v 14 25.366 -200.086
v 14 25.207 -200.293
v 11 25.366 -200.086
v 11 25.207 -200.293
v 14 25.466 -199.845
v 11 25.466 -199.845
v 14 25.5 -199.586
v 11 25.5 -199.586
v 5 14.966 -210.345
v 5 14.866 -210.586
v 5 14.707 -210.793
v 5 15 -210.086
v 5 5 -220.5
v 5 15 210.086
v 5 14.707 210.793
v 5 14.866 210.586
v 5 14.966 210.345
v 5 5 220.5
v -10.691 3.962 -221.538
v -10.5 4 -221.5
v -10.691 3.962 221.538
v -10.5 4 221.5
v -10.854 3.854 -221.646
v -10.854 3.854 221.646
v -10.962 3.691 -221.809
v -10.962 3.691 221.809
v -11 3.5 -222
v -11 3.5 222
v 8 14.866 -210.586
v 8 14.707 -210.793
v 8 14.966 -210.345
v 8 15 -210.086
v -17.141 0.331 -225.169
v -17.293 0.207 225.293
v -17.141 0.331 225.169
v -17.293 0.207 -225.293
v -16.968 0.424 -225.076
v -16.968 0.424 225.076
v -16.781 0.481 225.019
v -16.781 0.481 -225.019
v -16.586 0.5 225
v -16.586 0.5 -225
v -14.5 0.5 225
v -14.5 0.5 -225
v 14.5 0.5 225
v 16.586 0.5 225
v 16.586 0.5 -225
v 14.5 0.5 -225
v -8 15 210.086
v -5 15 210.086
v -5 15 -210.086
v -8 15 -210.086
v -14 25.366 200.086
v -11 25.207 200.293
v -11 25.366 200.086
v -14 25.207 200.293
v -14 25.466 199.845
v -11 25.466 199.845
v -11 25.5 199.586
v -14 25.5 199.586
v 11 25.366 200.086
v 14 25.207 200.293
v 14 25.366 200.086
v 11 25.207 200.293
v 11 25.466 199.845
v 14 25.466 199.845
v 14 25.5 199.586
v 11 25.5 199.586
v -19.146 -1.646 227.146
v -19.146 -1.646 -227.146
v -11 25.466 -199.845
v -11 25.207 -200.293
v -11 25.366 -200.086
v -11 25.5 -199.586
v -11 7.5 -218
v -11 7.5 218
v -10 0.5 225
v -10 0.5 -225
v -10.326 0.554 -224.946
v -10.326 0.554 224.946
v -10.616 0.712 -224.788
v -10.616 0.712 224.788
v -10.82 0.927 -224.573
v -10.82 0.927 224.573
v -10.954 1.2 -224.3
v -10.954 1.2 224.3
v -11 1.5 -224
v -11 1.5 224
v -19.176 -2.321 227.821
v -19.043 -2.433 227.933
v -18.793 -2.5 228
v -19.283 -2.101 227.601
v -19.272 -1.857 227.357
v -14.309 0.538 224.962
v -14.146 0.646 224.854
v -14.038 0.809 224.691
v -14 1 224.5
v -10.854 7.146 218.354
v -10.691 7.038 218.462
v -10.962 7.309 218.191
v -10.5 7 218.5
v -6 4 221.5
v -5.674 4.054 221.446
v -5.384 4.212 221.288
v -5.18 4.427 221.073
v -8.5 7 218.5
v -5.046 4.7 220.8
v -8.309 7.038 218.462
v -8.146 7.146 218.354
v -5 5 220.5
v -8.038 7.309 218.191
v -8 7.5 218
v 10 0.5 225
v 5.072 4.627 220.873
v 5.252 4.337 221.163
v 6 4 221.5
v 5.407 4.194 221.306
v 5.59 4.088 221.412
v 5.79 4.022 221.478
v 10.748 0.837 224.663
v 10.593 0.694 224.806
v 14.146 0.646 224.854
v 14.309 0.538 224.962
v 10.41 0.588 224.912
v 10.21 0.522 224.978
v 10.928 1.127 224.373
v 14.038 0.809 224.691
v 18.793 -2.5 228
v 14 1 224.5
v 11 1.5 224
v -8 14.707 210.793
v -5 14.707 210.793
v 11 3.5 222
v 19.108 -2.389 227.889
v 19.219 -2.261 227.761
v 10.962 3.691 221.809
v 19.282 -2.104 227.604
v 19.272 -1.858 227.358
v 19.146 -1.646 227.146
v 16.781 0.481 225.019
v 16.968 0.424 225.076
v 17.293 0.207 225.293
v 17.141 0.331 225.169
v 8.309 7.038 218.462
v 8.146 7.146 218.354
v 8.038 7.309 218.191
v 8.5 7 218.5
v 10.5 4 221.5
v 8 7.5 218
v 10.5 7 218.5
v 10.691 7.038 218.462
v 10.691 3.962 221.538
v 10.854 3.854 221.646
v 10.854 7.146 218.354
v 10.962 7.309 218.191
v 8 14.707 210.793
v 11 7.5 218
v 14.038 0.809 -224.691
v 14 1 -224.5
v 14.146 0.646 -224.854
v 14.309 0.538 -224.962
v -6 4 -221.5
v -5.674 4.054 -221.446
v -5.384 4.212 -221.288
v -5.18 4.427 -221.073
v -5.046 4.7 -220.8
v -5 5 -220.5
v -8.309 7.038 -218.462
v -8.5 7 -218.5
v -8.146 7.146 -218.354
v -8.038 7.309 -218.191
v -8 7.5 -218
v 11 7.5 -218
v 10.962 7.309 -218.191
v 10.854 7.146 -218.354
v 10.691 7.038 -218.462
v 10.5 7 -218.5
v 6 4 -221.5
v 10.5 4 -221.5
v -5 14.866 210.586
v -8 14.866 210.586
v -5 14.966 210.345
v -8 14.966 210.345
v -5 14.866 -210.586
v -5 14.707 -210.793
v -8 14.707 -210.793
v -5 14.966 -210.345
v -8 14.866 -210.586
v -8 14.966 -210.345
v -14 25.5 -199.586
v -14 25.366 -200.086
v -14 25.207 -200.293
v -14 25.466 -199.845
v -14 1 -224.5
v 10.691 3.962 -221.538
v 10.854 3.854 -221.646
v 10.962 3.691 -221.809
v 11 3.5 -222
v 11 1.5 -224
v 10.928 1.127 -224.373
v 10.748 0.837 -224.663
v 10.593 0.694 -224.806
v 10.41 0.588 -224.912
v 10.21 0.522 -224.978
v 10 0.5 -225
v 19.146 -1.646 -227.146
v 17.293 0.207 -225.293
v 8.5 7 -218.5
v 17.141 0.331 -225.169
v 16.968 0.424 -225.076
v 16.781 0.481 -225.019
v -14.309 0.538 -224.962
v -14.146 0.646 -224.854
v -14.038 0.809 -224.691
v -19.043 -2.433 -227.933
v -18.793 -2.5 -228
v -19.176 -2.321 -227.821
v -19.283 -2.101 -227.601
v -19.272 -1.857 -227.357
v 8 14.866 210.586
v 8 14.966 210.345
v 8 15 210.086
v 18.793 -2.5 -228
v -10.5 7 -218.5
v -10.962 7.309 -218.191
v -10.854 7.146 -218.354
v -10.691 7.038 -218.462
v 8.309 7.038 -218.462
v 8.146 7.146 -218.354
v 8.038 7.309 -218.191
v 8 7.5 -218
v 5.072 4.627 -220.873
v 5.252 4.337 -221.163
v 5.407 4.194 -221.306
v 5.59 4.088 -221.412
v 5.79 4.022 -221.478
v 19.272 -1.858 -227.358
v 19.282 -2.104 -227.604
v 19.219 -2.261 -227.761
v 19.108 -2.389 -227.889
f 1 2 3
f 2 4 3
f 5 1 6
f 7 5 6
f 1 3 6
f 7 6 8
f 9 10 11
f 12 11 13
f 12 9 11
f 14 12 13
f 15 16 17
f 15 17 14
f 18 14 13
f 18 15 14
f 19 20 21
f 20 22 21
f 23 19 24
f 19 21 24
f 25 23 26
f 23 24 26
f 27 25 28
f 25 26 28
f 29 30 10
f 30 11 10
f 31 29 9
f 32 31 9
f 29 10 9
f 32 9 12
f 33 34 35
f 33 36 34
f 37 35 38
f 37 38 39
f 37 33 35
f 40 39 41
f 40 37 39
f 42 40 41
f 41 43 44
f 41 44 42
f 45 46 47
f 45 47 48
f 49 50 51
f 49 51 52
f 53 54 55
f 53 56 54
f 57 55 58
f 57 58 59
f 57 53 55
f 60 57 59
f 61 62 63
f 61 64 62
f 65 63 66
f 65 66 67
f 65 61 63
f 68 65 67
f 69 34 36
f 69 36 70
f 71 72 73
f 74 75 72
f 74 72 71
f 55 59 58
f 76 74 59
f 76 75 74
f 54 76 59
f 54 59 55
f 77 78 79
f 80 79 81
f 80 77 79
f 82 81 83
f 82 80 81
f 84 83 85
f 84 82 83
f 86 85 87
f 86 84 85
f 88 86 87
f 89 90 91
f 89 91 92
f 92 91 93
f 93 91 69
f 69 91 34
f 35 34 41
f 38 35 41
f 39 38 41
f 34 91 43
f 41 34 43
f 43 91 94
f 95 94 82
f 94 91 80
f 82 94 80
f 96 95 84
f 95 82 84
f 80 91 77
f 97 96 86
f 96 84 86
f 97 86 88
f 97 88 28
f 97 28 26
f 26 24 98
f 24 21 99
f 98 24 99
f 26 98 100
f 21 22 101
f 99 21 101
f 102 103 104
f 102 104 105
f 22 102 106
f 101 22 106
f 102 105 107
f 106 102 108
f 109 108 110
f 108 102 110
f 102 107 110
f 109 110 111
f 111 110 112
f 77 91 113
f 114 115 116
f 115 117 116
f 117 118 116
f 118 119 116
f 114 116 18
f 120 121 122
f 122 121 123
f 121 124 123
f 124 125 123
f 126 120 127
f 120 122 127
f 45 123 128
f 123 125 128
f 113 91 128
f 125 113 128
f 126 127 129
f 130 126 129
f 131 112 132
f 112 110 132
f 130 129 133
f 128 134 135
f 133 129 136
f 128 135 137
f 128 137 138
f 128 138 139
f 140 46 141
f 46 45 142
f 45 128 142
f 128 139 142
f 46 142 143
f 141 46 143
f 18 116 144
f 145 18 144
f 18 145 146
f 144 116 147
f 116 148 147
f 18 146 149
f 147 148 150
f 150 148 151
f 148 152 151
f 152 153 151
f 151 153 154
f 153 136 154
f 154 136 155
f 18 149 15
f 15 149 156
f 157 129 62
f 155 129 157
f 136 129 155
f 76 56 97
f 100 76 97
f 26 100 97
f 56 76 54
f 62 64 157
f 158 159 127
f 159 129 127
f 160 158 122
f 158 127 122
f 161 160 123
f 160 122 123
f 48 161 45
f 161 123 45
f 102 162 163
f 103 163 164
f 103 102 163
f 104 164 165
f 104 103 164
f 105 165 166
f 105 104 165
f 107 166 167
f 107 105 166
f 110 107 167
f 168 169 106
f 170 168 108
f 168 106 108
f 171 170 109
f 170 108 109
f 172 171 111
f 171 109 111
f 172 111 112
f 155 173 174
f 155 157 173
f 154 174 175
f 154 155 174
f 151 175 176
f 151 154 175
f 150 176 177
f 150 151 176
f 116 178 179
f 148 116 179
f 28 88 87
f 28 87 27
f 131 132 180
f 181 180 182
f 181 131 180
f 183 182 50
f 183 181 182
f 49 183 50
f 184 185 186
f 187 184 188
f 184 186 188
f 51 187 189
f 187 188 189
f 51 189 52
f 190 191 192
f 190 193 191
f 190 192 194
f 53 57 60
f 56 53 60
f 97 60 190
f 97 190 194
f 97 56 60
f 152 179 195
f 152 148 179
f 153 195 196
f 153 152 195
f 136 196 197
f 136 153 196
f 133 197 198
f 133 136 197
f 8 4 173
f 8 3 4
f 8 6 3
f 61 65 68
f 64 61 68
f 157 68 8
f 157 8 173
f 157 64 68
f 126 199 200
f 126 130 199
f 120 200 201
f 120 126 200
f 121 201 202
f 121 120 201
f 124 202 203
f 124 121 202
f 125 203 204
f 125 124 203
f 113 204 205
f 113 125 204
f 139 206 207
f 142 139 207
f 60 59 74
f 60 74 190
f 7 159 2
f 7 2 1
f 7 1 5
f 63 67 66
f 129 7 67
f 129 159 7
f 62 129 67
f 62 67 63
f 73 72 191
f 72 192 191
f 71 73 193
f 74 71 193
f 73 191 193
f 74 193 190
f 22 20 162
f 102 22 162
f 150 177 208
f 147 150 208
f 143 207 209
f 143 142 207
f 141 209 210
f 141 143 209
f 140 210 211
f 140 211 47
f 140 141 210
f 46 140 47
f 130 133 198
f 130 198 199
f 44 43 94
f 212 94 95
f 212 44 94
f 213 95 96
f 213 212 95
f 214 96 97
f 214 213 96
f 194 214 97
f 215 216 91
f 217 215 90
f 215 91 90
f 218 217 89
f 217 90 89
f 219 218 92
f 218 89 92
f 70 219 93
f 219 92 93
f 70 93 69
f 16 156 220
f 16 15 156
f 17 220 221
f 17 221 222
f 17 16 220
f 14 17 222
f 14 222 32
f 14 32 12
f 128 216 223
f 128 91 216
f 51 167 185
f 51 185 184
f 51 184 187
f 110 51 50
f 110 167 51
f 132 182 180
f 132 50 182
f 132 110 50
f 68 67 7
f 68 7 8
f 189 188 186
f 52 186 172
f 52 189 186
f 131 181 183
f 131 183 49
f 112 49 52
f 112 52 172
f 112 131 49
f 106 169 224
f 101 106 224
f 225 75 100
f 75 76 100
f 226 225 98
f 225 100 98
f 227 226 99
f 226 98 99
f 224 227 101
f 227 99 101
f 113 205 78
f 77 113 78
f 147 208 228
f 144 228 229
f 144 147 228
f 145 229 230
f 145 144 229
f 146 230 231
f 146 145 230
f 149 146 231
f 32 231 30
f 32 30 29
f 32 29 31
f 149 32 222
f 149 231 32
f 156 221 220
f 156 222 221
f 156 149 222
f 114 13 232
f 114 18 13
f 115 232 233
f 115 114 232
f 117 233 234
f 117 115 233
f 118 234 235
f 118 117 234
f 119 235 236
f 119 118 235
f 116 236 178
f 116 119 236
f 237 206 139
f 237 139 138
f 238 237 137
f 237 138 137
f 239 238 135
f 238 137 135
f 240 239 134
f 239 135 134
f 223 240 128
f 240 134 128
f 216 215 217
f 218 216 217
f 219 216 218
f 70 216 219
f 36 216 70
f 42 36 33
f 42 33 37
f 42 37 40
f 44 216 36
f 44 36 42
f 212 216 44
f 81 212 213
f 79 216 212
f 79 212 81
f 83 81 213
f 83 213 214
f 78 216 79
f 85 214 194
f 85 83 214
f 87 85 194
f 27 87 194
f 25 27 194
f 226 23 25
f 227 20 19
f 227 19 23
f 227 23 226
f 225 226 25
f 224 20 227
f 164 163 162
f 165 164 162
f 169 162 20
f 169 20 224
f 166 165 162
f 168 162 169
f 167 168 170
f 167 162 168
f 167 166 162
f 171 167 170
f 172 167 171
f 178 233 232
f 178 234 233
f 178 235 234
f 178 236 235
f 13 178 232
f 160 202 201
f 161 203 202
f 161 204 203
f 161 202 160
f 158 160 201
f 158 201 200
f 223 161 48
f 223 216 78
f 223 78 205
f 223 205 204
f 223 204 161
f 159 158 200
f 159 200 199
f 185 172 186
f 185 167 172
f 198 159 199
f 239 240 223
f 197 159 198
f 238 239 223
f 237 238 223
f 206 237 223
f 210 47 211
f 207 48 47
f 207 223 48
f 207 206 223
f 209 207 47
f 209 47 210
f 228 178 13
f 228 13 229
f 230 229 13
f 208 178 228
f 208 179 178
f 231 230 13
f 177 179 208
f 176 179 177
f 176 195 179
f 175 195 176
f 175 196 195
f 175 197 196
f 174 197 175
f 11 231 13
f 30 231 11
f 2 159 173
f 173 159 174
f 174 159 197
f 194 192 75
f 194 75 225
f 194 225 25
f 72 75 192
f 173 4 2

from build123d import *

# Parameters (mm, degrees)
F1_DEPTH = 228
F3_DEPTH = 30
F4_R     = 1
F6_R     = 0.5
F7_R     = 0.5


# Not quite as in the source:
# - two fillets or chamfers of one size are made in one step
# - a pattern or mirror of a feature is missing from the dataset's text; its kind, count and spacing are read off the source's solid


with BuildPart() as f1:
    # F0 (on Top) → F1 (new body, symmetric)
    with BuildSketch(Plane.XY):
        Polygon((-14, 0.5), (-17, 0.5), (-20, -2.5), (20, -2.5), (17, 0.5), (14, 0.5), (11, 0.5), (-11, 0.5), align=None)
        Polygon((-14, 25.5), (-14, 0.5), (-11, 0.5), (-11, 4), (-11, 7), (-11, 25.5), align=None)
        Polygon((11, 4), (11, 0.5), (14, 0.5), (14, 25.5), (11, 25.5), (11, 7), align=None)
        Polygon((-11, 7), (-11, 4), (-5, 4), (-5, 7), (-5, 15), (-8, 15), (-8, 7), align=None)
        Polygon((5, 4), (11, 4), (11, 7), (8, 7), (8, 15), (5, 15), (5, 7), align=None)
    extrude(amount=F1_DEPTH, both=True)

    # F2 (on Right) → F3 (cut, symmetric)
    with BuildSketch(Plane.YZ):
        Polygon((25.5, 228), (0.5, 228), (-2.5, 228), (25.5, 200), align=None)
    f3 = extrude(amount=F3_DEPTH, both=True, mode=Mode.SUBTRACT)

    # F3_copies: F3 across plane
    add(f3.mirror(Plane(origin=(0, 0, 0), x_dir=(-1, 0, 0), z_dir=(0, 0, -1))), mode=Mode.SUBTRACT)

    # F4
    f4_edges = [f1.edges().sort_by_distance(p)[0] for p in [
        (17, 0.5, 0),
        (12.5, 25.5, 200),
        (-11, 0.5, 0),
        (-12.5, 25.5, 200),
        (-17, 0.5, 0),
        (11, 0.5, 0),
        (6.5, 15, 210.5),
        (-6.5, 15, 210.5),
        (12.5, 25.5, -200),
        (6.5, 15, -210.5),
        (-6.5, 15, -210.5),
        (-12.5, 25.5, -200),
        (5, 4, 0),
        (-5, 4, 0),
    ]]
    fillet(f4_edges, radius=F4_R)

    # F6
    f6_edges = [f1.edges().sort_by_distance(p)[0] for p in [
        (8, 7, 0),
        (-11, 7, 0),
        (-11, 4, 0),
        (11, 4, 0),
        (11, 7, 0),
        (-8, 7, 0),
    ]]
    fillet(f6_edges, radius=F6_R)

    # F7
    f7_edges = [f1.edges().sort_by_distance(p)[0] for p in [
        (-20, -2.5, 0),
        (20, -2.5, 0),
        (14, 0.5, 0),
        (-14, 0.5, 0),
    ]]
    fillet(f7_edges, radius=F7_R)


solid = f1.part
